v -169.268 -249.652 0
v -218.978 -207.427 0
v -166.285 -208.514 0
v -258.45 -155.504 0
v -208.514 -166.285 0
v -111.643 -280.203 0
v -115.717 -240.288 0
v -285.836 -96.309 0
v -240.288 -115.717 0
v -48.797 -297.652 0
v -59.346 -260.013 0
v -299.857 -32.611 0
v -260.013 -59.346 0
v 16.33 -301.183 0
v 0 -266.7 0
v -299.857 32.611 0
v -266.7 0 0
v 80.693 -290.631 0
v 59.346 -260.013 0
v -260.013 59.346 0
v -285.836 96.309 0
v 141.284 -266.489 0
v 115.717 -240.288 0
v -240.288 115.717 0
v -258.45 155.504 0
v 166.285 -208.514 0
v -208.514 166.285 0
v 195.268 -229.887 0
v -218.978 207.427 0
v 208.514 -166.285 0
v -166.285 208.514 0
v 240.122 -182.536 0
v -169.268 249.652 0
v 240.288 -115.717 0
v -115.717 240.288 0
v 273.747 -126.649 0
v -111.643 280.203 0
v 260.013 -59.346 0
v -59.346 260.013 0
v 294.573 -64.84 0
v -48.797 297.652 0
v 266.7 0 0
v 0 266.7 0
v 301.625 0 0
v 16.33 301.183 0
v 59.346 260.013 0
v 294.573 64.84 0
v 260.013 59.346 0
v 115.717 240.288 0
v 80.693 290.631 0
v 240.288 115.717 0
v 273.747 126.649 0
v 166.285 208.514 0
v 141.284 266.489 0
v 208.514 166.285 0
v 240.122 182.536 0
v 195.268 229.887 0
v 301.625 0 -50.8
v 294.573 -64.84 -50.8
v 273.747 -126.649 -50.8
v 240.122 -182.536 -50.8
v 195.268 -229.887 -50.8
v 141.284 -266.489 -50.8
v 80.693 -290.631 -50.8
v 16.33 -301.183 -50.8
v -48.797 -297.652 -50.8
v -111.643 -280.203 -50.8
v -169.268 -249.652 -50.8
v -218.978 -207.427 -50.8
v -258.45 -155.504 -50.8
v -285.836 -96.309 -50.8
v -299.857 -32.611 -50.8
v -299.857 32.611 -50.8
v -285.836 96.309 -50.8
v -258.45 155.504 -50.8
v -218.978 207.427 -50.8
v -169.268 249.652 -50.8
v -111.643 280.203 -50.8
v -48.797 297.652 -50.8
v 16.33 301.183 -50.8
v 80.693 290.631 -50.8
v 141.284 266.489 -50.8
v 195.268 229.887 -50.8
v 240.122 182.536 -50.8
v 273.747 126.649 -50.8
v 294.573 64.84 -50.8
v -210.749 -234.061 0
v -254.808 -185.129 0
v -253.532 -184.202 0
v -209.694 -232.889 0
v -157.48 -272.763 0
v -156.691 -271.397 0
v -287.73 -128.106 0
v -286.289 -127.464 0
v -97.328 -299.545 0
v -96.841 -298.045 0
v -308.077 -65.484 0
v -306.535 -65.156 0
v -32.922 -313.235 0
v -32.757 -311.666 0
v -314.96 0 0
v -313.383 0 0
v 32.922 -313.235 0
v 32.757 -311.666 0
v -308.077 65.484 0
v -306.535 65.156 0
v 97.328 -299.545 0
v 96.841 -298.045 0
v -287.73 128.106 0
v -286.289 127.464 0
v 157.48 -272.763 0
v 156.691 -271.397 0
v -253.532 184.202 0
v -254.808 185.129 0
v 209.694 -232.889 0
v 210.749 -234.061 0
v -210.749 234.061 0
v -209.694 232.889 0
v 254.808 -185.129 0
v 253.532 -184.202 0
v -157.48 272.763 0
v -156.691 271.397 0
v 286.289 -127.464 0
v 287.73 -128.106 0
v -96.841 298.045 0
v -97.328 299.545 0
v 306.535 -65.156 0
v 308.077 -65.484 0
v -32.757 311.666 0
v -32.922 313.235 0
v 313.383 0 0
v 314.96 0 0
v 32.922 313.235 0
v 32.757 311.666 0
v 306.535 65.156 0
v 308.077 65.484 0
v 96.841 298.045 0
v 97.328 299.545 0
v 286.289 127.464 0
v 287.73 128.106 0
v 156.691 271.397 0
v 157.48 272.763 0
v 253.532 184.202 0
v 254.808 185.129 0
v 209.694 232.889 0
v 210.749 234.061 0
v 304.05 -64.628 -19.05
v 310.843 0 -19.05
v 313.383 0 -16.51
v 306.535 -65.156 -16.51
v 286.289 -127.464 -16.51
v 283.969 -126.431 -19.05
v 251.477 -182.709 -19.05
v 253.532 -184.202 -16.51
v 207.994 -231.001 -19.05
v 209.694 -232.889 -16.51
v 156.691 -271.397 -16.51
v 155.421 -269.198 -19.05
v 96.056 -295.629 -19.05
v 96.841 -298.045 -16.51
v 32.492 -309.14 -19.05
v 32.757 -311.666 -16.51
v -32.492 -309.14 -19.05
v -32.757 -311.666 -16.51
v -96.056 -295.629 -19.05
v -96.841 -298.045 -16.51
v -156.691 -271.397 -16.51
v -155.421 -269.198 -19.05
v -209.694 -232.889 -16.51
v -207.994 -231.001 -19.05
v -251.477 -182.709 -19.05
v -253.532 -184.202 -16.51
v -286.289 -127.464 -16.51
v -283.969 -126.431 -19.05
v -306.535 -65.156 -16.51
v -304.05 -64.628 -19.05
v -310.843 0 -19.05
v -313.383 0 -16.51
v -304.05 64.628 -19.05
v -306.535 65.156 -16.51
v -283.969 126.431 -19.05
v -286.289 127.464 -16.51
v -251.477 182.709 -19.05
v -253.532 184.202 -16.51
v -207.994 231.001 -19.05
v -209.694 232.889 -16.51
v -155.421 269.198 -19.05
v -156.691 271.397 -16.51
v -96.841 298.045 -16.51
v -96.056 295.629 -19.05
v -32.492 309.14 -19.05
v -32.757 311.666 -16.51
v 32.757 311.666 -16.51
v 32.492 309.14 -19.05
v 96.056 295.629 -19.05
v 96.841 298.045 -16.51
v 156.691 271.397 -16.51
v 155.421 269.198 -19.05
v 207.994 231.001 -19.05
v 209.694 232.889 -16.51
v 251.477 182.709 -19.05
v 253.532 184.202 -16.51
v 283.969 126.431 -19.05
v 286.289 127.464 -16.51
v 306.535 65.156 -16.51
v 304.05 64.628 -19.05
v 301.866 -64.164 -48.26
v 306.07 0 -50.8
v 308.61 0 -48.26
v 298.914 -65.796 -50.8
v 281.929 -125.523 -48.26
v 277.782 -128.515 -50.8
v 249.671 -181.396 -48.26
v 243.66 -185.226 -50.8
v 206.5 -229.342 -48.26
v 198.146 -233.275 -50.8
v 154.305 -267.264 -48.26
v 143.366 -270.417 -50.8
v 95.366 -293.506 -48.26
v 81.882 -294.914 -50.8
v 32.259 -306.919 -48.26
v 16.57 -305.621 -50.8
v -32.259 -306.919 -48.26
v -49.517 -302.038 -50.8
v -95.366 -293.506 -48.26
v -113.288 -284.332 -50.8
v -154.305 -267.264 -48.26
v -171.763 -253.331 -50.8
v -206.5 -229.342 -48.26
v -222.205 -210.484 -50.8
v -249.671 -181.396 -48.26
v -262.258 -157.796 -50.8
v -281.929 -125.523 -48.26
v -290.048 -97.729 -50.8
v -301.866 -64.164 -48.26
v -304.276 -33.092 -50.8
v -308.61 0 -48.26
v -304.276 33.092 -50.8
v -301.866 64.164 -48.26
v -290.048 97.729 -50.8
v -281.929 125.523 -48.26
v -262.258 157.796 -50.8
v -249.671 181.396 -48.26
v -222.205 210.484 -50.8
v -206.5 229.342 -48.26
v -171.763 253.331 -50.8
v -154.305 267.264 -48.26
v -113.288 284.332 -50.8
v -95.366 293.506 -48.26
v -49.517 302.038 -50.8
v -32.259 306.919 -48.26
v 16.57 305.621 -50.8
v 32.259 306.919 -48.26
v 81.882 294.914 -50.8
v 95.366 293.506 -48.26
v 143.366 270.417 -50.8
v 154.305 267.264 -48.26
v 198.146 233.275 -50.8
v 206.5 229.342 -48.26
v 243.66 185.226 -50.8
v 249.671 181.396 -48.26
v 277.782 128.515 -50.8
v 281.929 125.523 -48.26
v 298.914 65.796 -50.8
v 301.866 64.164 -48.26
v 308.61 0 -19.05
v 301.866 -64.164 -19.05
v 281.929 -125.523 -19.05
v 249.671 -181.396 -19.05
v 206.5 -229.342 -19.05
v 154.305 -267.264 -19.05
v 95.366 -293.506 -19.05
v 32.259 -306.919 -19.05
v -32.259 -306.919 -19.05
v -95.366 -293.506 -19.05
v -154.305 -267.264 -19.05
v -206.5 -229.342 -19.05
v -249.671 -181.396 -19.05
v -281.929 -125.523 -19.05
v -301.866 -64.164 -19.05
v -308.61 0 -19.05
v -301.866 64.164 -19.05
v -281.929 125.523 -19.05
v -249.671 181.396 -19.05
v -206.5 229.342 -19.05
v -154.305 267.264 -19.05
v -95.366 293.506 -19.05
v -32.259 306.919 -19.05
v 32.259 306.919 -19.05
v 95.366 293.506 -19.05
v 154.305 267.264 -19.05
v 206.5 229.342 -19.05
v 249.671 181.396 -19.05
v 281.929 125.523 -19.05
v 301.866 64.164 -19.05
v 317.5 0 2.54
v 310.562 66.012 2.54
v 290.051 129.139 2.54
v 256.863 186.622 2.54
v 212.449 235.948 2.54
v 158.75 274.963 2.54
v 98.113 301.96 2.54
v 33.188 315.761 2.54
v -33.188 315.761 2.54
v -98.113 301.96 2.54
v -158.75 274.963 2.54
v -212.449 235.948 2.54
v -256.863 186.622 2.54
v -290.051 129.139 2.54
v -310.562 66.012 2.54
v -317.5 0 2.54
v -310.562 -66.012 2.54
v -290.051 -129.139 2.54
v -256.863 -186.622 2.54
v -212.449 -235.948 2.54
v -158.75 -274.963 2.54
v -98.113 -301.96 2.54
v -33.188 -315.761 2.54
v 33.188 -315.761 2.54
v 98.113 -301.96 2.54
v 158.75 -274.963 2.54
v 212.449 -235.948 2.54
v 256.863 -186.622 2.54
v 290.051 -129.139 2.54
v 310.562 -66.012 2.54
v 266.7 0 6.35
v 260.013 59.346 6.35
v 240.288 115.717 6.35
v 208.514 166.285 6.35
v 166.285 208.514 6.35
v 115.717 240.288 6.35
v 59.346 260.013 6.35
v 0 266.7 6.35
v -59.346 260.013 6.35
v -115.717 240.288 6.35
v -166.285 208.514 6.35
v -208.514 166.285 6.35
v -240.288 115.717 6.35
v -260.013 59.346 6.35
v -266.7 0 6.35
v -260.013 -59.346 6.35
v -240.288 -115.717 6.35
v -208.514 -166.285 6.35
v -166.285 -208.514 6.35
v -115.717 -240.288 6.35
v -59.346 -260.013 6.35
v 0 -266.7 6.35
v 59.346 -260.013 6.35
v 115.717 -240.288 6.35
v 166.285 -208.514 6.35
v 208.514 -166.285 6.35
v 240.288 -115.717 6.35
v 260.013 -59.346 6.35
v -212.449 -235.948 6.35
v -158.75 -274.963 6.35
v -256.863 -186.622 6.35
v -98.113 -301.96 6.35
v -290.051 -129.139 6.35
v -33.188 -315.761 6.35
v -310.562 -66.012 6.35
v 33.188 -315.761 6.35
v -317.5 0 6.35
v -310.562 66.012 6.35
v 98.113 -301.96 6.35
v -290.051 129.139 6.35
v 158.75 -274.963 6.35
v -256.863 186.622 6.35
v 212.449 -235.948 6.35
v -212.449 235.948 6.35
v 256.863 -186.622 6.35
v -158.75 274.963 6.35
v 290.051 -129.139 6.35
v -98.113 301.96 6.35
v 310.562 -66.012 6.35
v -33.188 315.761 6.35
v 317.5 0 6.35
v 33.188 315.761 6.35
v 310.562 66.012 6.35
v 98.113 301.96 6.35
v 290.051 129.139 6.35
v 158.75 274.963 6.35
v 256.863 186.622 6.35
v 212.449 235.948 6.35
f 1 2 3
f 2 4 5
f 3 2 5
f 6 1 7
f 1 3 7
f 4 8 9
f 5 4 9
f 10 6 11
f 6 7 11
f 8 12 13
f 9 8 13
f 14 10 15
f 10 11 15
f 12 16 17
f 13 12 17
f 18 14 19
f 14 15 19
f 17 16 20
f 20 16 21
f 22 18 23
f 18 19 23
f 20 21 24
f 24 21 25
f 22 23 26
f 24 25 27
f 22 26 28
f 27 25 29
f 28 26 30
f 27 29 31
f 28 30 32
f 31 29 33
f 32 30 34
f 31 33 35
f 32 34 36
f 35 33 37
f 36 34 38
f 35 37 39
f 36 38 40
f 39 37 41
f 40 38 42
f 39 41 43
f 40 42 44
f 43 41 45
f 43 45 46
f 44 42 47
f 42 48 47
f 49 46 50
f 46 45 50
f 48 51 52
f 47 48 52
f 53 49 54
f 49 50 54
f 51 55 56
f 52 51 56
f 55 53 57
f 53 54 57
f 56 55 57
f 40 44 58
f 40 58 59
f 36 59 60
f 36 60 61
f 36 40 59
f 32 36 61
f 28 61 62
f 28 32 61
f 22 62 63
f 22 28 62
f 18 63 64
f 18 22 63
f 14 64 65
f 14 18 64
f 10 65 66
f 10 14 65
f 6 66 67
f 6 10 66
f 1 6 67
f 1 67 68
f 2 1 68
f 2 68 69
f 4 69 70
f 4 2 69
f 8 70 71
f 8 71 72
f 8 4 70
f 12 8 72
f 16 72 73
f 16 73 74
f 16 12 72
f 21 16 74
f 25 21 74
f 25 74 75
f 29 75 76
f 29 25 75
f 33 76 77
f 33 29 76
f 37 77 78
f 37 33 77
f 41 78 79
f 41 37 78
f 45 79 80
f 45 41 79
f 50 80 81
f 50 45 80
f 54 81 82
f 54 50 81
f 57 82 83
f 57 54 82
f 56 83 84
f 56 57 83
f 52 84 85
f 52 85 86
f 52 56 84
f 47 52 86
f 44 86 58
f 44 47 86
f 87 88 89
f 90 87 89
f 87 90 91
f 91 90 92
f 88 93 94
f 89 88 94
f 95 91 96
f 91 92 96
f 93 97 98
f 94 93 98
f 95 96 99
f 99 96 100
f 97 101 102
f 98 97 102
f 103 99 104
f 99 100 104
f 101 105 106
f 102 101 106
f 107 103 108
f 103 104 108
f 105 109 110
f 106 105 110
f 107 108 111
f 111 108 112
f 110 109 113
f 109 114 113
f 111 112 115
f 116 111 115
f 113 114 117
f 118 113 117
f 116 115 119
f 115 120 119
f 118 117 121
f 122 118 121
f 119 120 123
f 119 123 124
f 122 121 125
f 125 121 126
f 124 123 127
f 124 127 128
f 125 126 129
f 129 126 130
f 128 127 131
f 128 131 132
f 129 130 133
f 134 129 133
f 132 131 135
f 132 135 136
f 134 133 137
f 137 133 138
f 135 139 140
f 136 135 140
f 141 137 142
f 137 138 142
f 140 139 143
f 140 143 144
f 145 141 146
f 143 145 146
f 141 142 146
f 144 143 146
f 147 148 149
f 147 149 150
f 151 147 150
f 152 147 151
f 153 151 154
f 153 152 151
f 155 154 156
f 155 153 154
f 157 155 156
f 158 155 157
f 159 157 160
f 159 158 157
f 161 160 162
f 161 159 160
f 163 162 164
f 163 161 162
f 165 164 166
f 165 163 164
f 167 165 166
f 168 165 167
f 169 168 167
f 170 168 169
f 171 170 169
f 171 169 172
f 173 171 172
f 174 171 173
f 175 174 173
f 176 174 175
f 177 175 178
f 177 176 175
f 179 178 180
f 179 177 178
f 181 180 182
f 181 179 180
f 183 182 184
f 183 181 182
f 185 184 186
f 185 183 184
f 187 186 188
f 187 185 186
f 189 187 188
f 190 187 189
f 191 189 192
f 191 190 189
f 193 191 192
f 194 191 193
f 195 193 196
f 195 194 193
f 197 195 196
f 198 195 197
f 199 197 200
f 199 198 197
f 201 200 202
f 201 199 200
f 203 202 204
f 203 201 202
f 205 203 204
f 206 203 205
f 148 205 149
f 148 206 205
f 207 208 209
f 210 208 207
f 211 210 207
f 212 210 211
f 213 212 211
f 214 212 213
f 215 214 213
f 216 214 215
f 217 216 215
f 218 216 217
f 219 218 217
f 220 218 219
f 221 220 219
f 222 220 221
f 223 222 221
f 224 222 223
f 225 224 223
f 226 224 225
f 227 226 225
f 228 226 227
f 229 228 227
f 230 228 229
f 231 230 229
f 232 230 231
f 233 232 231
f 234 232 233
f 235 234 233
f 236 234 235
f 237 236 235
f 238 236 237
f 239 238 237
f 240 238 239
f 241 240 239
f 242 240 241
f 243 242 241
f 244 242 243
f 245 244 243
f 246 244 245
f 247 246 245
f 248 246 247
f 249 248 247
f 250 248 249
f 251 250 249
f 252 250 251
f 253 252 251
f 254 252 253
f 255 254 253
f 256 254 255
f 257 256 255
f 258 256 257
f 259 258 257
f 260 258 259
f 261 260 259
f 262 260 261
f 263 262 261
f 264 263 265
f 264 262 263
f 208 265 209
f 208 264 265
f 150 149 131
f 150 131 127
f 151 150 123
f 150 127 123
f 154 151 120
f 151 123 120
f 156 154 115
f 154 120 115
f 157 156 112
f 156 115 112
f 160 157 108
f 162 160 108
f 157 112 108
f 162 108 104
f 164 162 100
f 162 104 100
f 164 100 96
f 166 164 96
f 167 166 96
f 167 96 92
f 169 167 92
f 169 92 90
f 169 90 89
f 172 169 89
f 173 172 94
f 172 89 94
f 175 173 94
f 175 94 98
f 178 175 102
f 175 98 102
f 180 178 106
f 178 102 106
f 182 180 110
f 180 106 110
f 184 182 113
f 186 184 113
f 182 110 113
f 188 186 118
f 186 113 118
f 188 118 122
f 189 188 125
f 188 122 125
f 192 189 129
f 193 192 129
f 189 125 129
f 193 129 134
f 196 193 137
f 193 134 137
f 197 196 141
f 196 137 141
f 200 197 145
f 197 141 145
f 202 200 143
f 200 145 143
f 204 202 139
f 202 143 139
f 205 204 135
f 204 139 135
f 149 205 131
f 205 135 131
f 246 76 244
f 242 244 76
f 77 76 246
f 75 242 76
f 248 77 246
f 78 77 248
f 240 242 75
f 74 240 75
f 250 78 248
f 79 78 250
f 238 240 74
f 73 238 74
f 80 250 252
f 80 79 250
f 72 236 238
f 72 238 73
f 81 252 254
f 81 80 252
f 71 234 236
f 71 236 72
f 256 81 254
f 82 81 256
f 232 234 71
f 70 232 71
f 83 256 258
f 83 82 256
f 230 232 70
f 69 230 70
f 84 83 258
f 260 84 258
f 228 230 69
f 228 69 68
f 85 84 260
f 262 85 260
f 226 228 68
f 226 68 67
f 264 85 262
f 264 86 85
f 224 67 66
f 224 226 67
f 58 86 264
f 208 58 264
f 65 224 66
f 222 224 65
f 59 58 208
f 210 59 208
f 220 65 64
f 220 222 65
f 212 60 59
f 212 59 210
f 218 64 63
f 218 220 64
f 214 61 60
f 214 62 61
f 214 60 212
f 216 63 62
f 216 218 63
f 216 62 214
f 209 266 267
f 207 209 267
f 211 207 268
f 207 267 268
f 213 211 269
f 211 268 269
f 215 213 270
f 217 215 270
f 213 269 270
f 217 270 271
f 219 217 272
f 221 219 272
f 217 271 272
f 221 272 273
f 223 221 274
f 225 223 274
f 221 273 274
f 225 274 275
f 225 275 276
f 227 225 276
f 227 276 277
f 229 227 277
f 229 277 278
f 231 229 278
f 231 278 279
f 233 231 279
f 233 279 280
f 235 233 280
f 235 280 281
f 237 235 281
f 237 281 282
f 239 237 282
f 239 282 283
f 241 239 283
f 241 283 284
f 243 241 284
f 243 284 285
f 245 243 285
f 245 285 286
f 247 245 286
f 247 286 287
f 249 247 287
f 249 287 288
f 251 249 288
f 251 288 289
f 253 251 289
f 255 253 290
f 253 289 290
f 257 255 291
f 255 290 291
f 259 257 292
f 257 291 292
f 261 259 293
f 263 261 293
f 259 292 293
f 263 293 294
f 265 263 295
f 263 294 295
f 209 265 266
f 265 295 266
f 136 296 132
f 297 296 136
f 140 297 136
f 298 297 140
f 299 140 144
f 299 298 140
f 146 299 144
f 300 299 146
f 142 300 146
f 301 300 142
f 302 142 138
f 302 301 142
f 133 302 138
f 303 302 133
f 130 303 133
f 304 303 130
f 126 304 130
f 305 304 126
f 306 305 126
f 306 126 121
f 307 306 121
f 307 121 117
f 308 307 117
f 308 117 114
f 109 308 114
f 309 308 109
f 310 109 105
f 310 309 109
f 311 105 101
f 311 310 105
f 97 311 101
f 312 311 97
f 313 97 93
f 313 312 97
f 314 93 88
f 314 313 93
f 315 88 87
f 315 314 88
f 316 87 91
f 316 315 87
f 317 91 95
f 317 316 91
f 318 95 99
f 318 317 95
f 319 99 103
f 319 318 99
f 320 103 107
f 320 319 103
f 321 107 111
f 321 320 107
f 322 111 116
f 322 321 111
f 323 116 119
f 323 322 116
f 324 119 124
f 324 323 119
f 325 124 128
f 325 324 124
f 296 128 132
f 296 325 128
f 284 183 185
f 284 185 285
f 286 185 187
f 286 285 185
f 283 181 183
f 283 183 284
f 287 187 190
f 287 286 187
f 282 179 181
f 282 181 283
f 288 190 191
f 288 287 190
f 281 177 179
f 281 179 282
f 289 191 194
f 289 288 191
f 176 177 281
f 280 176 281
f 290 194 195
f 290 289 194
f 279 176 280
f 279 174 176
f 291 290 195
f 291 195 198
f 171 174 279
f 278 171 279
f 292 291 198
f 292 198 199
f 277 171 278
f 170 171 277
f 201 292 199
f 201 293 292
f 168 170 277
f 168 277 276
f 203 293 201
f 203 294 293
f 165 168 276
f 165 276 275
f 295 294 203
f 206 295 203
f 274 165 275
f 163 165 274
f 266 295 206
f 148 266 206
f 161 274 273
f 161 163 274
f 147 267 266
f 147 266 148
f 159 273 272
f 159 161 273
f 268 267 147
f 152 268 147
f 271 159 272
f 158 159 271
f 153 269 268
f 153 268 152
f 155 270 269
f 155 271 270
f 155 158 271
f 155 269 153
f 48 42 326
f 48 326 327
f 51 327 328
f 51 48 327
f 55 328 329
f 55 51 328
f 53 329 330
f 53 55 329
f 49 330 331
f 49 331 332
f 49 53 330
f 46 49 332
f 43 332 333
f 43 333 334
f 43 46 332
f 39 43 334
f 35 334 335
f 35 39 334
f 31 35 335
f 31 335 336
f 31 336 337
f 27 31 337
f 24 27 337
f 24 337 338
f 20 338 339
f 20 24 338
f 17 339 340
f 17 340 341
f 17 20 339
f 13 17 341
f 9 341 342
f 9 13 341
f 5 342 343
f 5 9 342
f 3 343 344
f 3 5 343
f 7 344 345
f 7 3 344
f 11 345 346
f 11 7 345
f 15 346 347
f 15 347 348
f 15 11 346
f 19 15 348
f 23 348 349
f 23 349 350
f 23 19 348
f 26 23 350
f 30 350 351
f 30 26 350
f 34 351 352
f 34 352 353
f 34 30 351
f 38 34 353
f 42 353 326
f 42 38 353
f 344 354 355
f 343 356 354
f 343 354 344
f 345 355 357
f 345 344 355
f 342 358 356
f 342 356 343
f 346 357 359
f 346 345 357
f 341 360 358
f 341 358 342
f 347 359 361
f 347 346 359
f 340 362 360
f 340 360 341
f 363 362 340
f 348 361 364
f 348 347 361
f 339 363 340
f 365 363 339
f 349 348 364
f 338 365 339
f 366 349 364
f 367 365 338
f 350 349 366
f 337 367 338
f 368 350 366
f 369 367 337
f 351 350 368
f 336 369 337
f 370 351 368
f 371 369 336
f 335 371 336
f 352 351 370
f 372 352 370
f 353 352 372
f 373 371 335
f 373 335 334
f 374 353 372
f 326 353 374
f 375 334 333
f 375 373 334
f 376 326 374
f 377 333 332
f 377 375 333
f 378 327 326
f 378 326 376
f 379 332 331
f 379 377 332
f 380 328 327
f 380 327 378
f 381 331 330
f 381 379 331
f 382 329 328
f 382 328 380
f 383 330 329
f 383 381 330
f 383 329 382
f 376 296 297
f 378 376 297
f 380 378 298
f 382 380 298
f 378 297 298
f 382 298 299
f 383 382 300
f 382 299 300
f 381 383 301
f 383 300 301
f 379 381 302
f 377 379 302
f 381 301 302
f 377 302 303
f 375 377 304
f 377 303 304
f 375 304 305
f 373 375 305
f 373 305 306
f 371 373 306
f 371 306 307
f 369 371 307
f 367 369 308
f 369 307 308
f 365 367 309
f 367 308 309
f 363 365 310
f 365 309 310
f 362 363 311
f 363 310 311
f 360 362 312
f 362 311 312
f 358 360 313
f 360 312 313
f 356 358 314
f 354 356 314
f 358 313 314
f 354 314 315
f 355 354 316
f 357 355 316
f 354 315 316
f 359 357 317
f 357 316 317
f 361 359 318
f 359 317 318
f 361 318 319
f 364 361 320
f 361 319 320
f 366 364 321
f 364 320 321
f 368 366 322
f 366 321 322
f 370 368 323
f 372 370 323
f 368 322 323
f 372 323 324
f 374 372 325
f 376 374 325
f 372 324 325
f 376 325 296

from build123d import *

# Parameters (mm, degrees)
F0_R     = 317.5
F0_R_2   = 266.7
F1_DEPTH = 6.35
F2_R     = 308.61
F2_R_2   = 301.625
F3_DEPTH = 50.8
F2_R_3   = 313.382665
F4_DEPTH = 19.05
F5_SIZE  = 2.54


with BuildPart() as f1:
    # F0 (on Top) → F1 (new body)
    with BuildSketch(Plane.XY):
        Circle(F0_R)
        Circle(F0_R_2, mode=Mode.SUBTRACT)
    extrude(amount=F1_DEPTH)

    # F2 (on face) → F3 (join)
    with BuildSketch(Plane(origin=(0, 0, 0), x_dir=(1, 0, 0), z_dir=(0, 0, -1))):
        Circle(F2_R)
        Circle(F2_R_2, mode=Mode.SUBTRACT)
    extrude(amount=F3_DEPTH)

    # F2 (on face) → F4 (join)
    with BuildSketch(Plane(origin=(0, 0, 0), x_dir=(1, 0, 0), z_dir=(0, 0, -1))):
        Circle(F2_R_3)
        Circle(F2_R, mode=Mode.SUBTRACT)
    extrude(amount=F4_DEPTH)

    # F5
    f5_edges = [f1.edges().sort_by_distance(p)[0] for p in [
        (-313.382665, 0, -19.05),
        (-317.5, 0, 0),
        (-308.61, 0, -50.8),
    ]]
    chamfer(f5_edges, length=F5_SIZE)


solid = f1.part
